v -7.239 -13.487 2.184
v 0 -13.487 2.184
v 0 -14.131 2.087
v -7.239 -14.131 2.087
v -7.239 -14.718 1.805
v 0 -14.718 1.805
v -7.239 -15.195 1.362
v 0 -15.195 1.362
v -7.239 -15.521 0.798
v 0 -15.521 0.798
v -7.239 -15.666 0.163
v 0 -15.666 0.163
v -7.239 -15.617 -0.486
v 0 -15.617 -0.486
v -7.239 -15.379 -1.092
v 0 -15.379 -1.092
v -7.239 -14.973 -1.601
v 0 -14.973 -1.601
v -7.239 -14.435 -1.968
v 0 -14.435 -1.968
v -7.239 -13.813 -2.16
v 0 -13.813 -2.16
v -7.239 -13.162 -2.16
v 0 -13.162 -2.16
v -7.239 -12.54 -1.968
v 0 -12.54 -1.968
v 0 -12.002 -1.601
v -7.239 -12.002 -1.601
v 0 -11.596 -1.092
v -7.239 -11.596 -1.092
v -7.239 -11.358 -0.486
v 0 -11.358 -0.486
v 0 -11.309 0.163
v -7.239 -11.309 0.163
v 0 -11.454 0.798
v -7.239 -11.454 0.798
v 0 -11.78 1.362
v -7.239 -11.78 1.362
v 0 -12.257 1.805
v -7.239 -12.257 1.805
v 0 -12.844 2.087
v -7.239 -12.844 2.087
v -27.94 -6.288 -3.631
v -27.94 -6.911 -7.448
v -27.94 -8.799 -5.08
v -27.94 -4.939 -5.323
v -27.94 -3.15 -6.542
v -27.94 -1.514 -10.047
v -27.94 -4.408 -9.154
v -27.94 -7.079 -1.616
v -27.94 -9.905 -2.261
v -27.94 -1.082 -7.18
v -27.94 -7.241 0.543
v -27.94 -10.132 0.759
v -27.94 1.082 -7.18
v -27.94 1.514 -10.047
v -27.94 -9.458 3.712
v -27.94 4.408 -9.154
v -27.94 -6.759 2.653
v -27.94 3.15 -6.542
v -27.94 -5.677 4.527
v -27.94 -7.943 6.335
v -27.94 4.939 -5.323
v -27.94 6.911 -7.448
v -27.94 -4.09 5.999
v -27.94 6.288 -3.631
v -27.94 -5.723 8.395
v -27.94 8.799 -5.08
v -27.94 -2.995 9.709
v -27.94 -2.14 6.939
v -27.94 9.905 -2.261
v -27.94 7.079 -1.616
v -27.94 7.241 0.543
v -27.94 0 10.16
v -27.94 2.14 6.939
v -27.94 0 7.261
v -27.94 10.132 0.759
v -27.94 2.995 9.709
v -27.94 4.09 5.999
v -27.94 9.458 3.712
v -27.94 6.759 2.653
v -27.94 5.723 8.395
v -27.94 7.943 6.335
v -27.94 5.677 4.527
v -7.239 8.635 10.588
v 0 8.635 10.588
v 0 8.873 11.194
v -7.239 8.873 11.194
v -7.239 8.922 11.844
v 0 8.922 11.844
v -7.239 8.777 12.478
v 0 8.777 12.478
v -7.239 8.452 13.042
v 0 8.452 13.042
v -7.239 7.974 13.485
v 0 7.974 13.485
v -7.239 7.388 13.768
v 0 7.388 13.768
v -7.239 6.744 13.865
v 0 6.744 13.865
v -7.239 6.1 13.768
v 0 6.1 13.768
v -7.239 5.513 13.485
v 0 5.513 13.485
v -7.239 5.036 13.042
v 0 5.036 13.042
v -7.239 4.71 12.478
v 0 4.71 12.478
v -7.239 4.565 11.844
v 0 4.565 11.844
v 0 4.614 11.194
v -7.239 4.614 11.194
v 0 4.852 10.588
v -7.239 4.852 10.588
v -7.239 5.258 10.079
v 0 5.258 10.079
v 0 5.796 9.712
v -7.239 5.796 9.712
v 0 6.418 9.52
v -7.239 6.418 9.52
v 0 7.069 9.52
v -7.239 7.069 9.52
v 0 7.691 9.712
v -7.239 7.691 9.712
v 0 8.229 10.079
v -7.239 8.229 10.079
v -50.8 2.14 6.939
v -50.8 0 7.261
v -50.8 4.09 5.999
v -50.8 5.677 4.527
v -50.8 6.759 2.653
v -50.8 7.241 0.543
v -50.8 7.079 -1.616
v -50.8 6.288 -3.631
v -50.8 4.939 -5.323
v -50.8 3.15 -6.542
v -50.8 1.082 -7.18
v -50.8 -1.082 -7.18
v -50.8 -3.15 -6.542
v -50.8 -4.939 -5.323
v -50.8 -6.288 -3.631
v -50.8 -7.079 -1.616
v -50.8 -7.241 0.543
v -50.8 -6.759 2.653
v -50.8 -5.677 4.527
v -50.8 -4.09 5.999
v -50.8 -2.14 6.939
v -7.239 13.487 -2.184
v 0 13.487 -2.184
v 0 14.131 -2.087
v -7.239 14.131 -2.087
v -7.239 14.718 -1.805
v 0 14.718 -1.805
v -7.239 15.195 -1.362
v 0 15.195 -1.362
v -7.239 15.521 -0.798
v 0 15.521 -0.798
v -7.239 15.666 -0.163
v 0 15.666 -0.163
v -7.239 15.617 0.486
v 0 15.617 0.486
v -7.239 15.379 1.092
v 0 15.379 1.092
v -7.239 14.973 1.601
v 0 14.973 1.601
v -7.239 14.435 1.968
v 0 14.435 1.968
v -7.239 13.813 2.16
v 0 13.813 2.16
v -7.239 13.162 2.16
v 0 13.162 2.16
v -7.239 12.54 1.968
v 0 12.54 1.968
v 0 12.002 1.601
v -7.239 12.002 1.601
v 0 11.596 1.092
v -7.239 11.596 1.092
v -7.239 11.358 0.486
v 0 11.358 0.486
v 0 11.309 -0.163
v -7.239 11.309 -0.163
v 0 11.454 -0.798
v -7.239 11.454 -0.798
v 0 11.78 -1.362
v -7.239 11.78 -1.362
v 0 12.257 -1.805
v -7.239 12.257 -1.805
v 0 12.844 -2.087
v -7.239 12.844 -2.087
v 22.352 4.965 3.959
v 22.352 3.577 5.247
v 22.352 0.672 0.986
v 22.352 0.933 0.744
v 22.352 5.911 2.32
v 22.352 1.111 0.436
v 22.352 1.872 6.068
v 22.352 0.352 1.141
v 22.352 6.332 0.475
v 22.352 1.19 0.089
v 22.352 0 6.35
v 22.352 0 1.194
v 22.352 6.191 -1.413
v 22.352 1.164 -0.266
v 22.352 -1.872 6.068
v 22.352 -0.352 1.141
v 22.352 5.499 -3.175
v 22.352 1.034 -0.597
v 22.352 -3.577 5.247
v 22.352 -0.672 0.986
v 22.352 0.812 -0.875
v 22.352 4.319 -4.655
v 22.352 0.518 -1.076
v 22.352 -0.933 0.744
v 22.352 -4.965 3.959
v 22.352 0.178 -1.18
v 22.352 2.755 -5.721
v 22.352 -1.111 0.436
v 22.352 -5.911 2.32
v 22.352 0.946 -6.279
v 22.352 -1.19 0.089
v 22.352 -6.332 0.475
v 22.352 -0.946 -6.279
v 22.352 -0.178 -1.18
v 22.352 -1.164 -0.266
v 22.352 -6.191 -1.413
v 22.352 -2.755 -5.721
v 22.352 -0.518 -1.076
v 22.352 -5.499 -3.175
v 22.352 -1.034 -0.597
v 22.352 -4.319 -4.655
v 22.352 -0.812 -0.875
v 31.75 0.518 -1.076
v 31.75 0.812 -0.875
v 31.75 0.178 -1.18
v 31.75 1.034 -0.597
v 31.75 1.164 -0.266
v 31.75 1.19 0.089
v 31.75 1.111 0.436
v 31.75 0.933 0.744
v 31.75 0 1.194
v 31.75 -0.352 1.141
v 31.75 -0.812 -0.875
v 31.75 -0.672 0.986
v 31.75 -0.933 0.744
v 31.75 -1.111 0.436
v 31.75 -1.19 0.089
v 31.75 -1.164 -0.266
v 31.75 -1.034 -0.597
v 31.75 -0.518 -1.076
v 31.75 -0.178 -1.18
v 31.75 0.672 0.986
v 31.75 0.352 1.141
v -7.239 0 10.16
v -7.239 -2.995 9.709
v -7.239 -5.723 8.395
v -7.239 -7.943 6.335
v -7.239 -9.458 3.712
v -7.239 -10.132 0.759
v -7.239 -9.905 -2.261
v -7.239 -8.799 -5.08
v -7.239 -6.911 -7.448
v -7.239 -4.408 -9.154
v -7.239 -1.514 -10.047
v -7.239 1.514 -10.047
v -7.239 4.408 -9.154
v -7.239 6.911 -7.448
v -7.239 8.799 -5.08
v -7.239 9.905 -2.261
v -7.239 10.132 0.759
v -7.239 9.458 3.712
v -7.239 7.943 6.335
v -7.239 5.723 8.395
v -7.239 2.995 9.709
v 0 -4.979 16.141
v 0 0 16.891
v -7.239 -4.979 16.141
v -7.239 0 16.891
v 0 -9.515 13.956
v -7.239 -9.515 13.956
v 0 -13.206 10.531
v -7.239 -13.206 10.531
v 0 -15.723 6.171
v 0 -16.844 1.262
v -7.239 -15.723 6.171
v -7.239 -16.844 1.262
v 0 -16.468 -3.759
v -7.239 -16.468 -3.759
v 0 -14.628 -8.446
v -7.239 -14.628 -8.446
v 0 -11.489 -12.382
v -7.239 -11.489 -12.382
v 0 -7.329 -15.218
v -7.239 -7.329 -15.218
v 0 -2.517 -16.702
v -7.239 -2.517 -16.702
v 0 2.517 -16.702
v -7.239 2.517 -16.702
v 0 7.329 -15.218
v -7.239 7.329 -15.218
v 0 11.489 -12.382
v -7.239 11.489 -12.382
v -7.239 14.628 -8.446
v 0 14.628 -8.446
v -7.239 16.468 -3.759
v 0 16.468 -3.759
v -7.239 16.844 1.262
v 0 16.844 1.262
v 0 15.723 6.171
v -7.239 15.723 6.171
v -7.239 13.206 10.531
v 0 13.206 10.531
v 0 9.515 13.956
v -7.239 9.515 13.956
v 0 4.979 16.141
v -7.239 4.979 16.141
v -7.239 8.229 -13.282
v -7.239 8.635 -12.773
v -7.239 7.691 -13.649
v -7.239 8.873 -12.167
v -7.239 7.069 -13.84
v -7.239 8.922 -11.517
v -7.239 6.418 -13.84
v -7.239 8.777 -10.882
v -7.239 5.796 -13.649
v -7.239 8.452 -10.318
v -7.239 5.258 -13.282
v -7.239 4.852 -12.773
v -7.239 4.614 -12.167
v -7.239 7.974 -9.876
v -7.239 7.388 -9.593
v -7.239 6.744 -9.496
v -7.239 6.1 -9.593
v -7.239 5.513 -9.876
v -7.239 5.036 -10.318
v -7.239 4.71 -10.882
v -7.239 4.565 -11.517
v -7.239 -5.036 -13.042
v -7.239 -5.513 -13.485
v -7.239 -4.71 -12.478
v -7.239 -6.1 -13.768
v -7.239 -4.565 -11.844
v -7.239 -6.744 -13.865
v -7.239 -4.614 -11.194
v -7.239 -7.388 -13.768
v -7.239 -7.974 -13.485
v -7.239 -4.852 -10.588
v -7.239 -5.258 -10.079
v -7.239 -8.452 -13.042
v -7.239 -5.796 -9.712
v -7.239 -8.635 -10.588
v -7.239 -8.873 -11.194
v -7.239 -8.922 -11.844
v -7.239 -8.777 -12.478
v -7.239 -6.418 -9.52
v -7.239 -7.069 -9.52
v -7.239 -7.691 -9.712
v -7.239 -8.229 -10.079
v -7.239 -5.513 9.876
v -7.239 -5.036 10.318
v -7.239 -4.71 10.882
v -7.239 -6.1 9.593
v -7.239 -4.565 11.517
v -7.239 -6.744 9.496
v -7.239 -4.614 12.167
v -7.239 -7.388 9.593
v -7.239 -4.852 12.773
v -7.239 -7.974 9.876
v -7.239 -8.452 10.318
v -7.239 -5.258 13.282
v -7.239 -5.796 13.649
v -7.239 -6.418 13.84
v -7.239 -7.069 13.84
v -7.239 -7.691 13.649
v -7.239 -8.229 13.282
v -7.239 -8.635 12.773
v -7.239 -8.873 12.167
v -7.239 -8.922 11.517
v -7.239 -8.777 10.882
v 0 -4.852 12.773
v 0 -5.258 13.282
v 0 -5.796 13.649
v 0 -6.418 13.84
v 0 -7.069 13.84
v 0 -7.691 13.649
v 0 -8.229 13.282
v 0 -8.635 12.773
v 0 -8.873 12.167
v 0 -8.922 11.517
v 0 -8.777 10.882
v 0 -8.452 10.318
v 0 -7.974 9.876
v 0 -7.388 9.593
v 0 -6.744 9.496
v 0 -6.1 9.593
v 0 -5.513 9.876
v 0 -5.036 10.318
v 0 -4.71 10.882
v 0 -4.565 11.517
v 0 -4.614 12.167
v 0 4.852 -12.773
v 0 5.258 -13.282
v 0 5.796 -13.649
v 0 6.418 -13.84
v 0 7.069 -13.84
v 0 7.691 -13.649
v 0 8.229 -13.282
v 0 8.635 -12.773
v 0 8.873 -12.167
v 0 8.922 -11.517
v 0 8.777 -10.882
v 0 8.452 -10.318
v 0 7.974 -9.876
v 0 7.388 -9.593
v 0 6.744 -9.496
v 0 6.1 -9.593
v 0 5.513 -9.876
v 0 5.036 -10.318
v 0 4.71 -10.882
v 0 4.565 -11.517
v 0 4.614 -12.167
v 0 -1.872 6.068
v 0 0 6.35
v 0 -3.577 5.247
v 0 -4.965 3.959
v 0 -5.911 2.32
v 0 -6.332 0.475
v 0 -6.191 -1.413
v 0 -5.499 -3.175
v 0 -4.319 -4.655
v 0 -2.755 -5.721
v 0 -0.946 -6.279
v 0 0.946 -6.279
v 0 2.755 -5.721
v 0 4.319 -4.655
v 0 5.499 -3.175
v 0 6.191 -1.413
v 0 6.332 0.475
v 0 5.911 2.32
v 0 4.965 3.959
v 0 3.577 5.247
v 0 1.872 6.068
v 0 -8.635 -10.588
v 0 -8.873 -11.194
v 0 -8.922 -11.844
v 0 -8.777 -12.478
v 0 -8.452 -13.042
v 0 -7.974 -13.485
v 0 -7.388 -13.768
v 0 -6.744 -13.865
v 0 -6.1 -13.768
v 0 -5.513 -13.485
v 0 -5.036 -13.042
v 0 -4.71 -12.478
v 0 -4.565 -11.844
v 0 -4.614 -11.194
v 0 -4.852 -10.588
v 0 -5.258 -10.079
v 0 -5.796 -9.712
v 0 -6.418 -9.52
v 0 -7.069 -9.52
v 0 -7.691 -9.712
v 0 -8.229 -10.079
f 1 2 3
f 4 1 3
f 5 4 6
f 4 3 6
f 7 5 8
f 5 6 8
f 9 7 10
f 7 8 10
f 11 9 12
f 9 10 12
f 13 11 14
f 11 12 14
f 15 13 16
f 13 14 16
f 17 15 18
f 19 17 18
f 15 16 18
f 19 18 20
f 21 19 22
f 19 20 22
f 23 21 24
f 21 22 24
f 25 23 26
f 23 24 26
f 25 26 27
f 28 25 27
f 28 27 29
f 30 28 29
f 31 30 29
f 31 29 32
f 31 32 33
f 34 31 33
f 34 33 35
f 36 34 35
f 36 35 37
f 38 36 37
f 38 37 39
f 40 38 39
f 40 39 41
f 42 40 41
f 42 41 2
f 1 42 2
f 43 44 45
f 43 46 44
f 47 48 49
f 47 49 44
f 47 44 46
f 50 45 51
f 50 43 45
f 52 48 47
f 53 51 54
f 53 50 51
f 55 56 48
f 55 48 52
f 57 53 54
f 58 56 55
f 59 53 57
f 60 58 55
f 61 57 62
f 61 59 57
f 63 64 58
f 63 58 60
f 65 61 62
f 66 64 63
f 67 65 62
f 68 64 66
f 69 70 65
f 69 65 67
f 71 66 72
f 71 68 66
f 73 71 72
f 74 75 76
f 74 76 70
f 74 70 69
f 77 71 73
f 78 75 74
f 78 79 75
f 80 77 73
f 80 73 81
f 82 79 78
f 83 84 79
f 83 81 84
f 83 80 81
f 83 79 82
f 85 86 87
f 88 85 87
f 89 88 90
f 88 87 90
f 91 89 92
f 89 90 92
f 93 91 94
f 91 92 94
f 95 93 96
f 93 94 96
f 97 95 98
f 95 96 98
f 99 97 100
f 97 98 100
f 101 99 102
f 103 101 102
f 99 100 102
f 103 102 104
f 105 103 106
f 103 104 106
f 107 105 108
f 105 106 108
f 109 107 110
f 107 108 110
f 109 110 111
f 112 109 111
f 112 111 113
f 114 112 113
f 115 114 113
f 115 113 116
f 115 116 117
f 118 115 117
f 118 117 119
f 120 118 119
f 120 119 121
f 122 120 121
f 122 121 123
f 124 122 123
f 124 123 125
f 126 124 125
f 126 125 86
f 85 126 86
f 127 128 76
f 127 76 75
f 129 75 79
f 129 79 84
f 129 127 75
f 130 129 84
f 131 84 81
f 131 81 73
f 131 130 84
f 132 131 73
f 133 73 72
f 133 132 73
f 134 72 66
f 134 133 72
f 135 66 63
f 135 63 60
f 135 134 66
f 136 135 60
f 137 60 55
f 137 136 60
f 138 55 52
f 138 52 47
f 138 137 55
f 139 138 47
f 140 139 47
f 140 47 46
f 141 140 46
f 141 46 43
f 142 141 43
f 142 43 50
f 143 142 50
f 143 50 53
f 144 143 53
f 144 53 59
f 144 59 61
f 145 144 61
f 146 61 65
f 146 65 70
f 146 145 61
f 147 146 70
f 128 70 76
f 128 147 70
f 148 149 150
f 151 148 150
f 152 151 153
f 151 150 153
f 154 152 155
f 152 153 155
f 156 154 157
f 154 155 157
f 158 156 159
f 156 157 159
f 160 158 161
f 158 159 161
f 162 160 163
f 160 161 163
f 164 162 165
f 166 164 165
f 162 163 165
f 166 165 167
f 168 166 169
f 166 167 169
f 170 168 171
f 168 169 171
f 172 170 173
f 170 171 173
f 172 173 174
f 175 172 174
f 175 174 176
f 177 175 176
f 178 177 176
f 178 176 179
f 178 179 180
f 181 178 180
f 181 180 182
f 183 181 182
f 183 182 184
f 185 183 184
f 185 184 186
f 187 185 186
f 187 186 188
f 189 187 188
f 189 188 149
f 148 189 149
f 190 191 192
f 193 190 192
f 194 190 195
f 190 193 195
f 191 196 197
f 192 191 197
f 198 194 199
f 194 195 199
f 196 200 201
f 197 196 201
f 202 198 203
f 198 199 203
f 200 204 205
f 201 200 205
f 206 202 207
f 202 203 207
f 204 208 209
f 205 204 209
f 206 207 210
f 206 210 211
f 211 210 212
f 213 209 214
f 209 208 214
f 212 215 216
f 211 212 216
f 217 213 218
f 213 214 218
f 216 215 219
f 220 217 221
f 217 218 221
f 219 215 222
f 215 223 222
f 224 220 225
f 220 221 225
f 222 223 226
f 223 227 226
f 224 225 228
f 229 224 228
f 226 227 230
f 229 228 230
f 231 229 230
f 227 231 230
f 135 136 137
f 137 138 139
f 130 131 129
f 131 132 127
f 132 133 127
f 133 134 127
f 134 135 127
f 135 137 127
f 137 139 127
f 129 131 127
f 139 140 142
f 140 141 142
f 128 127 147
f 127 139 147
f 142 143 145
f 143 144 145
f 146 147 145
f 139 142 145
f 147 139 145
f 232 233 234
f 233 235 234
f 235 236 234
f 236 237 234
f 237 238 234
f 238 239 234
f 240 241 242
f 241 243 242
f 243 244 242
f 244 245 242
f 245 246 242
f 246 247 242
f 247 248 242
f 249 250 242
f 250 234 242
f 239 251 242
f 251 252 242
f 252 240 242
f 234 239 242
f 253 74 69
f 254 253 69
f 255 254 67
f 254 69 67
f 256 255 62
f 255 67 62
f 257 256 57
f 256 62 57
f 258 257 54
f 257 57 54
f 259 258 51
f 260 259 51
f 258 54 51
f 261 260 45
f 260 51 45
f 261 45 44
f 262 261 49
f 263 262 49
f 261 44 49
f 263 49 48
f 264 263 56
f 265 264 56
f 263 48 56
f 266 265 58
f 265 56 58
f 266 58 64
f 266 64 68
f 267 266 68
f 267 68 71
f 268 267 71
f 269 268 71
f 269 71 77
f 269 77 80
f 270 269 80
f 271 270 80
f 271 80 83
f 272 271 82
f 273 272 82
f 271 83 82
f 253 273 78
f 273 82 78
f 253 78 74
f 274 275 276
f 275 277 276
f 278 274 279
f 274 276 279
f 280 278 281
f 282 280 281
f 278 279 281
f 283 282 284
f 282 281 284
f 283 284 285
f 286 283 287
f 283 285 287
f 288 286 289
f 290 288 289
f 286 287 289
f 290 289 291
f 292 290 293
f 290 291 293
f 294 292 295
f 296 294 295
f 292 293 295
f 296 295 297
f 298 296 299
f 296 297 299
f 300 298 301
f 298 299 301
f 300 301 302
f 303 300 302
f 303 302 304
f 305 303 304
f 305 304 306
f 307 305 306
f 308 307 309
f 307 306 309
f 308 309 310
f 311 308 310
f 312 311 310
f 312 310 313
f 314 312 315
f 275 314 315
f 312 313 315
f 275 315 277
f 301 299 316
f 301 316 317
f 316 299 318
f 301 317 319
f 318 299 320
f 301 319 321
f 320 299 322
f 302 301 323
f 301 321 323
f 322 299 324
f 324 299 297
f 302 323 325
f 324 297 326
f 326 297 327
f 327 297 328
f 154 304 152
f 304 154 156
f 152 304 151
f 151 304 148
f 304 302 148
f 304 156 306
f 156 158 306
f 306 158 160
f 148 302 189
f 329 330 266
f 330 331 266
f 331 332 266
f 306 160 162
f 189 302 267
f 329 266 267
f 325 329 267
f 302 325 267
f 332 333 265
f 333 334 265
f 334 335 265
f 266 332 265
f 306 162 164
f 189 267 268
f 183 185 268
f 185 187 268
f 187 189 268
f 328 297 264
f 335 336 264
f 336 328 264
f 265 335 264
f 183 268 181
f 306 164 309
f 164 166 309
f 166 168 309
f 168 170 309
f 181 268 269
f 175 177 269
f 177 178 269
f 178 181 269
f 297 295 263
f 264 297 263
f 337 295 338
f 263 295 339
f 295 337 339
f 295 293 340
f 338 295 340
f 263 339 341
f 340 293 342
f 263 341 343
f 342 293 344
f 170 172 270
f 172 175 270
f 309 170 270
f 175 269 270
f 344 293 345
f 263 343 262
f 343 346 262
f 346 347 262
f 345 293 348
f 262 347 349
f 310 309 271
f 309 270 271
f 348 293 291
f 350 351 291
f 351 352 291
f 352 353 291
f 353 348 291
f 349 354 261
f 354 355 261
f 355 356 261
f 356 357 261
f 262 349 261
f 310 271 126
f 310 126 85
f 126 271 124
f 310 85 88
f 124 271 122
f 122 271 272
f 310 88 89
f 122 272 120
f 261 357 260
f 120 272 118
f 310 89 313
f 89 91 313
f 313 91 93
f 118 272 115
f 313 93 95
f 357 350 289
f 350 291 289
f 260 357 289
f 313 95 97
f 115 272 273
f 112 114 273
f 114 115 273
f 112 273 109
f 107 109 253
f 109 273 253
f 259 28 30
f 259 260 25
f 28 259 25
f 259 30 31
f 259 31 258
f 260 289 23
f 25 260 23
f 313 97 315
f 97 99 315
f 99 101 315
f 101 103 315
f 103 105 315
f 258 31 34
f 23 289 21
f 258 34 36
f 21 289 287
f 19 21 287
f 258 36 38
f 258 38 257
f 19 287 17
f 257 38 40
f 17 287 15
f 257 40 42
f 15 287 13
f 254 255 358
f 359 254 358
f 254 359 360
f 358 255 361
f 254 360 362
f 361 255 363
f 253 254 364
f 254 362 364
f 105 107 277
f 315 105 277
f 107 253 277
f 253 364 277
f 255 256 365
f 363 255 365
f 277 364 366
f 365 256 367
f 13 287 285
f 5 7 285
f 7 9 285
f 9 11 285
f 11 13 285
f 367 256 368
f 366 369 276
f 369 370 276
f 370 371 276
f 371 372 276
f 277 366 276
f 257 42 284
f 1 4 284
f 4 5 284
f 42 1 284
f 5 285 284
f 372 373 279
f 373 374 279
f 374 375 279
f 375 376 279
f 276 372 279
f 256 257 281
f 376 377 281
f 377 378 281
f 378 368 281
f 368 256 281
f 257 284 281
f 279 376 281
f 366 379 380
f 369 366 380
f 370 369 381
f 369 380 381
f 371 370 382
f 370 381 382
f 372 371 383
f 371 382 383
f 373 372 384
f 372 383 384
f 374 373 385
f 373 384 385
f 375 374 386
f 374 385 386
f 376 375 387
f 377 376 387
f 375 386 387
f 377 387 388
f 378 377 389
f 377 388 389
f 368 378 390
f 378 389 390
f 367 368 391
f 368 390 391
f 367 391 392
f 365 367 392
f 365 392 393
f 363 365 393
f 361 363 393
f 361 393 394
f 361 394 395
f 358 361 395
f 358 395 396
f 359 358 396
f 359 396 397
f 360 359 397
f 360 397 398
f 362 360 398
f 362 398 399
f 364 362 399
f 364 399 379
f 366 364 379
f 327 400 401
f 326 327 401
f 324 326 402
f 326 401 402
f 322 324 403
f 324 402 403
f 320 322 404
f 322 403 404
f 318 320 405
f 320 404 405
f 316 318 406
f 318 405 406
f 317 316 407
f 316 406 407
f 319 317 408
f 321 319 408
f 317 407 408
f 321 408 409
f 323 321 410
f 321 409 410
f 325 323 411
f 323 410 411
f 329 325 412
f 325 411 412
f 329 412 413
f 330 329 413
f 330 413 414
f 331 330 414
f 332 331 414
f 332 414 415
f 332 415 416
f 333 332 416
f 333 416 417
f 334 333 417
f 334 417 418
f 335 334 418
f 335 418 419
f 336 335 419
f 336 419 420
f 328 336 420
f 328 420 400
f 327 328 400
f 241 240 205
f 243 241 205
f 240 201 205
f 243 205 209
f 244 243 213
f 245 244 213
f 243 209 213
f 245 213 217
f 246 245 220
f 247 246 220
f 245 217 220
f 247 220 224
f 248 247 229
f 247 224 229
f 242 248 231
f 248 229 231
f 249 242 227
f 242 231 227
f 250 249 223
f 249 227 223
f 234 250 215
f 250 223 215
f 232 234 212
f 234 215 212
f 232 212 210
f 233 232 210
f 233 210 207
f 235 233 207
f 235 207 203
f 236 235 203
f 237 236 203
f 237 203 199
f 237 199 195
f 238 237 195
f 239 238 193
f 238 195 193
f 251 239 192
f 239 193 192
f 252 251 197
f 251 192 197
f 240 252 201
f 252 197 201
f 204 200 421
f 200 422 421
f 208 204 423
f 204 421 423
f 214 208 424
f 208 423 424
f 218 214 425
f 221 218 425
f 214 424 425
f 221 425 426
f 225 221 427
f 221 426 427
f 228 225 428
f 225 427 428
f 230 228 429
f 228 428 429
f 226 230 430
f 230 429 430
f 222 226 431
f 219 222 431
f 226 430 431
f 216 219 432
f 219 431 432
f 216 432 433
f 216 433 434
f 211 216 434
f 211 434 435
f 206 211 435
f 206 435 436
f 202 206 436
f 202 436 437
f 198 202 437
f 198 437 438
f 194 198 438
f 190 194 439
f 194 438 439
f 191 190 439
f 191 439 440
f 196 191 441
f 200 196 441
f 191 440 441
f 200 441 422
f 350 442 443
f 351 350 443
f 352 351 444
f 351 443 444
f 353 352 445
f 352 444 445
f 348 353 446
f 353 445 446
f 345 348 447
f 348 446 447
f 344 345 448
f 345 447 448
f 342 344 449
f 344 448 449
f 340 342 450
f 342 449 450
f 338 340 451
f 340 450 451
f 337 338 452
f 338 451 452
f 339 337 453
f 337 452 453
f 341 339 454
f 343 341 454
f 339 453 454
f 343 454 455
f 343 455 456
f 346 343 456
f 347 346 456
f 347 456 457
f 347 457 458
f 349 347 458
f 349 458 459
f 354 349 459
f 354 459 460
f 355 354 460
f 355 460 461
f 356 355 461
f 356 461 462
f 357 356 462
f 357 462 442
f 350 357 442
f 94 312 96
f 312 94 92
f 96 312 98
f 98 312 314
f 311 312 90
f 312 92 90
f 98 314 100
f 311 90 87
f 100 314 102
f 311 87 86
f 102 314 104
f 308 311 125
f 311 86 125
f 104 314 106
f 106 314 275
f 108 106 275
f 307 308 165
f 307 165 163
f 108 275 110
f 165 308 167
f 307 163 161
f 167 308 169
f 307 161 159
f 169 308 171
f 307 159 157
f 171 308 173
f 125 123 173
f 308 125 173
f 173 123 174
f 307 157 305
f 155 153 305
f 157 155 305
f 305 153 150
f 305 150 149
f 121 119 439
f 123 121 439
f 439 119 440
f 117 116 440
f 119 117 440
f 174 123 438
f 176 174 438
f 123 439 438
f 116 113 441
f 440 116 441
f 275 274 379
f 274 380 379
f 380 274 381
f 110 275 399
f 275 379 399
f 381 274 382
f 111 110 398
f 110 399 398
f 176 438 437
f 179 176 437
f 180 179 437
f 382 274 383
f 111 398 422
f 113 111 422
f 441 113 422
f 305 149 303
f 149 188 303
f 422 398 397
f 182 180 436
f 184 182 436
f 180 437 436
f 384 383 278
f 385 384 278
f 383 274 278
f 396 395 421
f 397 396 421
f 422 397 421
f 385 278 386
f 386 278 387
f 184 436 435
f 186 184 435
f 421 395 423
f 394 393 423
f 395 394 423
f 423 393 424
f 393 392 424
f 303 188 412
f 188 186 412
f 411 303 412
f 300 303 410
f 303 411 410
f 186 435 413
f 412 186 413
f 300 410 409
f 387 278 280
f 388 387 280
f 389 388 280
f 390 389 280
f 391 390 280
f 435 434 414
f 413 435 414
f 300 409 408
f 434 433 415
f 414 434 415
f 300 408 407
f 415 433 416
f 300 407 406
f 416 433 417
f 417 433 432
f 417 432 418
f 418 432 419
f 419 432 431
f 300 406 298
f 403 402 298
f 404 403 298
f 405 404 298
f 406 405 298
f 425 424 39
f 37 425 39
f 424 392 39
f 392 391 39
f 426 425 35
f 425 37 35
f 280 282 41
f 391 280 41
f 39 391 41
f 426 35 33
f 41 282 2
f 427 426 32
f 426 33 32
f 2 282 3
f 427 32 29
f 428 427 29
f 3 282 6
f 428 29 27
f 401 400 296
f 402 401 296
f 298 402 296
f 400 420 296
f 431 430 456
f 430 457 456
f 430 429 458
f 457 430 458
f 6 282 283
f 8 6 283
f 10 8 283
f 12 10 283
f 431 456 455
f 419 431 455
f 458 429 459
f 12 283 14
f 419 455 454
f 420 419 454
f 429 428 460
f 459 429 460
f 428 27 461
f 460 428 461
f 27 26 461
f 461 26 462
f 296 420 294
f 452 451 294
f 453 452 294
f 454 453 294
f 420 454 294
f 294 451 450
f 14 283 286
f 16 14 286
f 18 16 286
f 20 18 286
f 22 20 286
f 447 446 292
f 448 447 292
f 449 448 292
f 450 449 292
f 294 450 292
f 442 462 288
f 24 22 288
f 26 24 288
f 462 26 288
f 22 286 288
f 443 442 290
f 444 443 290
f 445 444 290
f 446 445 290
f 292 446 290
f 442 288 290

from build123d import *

# Parameters (mm, degrees)
SKETCH2_R         = 2.1844
EXTRUDE1_DEPTH    = 57.136011276
CIRPATTERN1_COUNT = 6
SKETCH3_R         = 10.16
SKETCH3_R_2       = 7.261095031
EXTRUDE2_DEPTH    = 22.86


with BuildPart() as part:
    # Sketch1 → Revolve1 (revolve)
    with BuildSketch(Plane.XY, mode=Mode.PRIVATE) as revolve1_sk:
        Polygon((31.75, 0), (31.75, 1.1938), (22.352, 1.1938), (22.352, 6.35), (0, 6.35), (0, 16.891), (-7.239, 16.891), (-7.239, 10.16), (-50.8, 10.16), (-50.8, 0), align=None)
    revolve(revolve1_sk.sketch.rotate(Axis((-40.728426743, 0, 0), (1, 0, 0)), 90), axis=Axis((-40.728426743, 0, 0), (1, 0, 0)))

    # Sketch2 → Extrude1 (cut, through all)
    with BuildSketch(Plane(origin=(0, 0, 0), x_dir=(0, 0, -1), z_dir=(1, 0, 0))):
        with Locations((0, 13.4874)):
            Circle(SKETCH2_R)
    extrude1 = extrude(amount=-EXTRUDE1_DEPTH, mode=Mode.SUBTRACT)

    # CirPattern1: Extrude1 ×6 about axis
    cirpattern1_axis = Axis((0, 0, 0), (1, 0, 0))
    for i in range(1, CIRPATTERN1_COUNT):
        add(extrude1.rotate(cirpattern1_axis, i * 360 / CIRPATTERN1_COUNT), mode=Mode.SUBTRACT)

    # Sketch3 → Extrude2 (cut)
    with BuildSketch(Plane.ZY.offset(50.8)):
        Circle(SKETCH3_R)
        Circle(SKETCH3_R_2, mode=Mode.SUBTRACT)
    extrude(amount=-EXTRUDE2_DEPTH, mode=Mode.SUBTRACT)


solid = part.part
